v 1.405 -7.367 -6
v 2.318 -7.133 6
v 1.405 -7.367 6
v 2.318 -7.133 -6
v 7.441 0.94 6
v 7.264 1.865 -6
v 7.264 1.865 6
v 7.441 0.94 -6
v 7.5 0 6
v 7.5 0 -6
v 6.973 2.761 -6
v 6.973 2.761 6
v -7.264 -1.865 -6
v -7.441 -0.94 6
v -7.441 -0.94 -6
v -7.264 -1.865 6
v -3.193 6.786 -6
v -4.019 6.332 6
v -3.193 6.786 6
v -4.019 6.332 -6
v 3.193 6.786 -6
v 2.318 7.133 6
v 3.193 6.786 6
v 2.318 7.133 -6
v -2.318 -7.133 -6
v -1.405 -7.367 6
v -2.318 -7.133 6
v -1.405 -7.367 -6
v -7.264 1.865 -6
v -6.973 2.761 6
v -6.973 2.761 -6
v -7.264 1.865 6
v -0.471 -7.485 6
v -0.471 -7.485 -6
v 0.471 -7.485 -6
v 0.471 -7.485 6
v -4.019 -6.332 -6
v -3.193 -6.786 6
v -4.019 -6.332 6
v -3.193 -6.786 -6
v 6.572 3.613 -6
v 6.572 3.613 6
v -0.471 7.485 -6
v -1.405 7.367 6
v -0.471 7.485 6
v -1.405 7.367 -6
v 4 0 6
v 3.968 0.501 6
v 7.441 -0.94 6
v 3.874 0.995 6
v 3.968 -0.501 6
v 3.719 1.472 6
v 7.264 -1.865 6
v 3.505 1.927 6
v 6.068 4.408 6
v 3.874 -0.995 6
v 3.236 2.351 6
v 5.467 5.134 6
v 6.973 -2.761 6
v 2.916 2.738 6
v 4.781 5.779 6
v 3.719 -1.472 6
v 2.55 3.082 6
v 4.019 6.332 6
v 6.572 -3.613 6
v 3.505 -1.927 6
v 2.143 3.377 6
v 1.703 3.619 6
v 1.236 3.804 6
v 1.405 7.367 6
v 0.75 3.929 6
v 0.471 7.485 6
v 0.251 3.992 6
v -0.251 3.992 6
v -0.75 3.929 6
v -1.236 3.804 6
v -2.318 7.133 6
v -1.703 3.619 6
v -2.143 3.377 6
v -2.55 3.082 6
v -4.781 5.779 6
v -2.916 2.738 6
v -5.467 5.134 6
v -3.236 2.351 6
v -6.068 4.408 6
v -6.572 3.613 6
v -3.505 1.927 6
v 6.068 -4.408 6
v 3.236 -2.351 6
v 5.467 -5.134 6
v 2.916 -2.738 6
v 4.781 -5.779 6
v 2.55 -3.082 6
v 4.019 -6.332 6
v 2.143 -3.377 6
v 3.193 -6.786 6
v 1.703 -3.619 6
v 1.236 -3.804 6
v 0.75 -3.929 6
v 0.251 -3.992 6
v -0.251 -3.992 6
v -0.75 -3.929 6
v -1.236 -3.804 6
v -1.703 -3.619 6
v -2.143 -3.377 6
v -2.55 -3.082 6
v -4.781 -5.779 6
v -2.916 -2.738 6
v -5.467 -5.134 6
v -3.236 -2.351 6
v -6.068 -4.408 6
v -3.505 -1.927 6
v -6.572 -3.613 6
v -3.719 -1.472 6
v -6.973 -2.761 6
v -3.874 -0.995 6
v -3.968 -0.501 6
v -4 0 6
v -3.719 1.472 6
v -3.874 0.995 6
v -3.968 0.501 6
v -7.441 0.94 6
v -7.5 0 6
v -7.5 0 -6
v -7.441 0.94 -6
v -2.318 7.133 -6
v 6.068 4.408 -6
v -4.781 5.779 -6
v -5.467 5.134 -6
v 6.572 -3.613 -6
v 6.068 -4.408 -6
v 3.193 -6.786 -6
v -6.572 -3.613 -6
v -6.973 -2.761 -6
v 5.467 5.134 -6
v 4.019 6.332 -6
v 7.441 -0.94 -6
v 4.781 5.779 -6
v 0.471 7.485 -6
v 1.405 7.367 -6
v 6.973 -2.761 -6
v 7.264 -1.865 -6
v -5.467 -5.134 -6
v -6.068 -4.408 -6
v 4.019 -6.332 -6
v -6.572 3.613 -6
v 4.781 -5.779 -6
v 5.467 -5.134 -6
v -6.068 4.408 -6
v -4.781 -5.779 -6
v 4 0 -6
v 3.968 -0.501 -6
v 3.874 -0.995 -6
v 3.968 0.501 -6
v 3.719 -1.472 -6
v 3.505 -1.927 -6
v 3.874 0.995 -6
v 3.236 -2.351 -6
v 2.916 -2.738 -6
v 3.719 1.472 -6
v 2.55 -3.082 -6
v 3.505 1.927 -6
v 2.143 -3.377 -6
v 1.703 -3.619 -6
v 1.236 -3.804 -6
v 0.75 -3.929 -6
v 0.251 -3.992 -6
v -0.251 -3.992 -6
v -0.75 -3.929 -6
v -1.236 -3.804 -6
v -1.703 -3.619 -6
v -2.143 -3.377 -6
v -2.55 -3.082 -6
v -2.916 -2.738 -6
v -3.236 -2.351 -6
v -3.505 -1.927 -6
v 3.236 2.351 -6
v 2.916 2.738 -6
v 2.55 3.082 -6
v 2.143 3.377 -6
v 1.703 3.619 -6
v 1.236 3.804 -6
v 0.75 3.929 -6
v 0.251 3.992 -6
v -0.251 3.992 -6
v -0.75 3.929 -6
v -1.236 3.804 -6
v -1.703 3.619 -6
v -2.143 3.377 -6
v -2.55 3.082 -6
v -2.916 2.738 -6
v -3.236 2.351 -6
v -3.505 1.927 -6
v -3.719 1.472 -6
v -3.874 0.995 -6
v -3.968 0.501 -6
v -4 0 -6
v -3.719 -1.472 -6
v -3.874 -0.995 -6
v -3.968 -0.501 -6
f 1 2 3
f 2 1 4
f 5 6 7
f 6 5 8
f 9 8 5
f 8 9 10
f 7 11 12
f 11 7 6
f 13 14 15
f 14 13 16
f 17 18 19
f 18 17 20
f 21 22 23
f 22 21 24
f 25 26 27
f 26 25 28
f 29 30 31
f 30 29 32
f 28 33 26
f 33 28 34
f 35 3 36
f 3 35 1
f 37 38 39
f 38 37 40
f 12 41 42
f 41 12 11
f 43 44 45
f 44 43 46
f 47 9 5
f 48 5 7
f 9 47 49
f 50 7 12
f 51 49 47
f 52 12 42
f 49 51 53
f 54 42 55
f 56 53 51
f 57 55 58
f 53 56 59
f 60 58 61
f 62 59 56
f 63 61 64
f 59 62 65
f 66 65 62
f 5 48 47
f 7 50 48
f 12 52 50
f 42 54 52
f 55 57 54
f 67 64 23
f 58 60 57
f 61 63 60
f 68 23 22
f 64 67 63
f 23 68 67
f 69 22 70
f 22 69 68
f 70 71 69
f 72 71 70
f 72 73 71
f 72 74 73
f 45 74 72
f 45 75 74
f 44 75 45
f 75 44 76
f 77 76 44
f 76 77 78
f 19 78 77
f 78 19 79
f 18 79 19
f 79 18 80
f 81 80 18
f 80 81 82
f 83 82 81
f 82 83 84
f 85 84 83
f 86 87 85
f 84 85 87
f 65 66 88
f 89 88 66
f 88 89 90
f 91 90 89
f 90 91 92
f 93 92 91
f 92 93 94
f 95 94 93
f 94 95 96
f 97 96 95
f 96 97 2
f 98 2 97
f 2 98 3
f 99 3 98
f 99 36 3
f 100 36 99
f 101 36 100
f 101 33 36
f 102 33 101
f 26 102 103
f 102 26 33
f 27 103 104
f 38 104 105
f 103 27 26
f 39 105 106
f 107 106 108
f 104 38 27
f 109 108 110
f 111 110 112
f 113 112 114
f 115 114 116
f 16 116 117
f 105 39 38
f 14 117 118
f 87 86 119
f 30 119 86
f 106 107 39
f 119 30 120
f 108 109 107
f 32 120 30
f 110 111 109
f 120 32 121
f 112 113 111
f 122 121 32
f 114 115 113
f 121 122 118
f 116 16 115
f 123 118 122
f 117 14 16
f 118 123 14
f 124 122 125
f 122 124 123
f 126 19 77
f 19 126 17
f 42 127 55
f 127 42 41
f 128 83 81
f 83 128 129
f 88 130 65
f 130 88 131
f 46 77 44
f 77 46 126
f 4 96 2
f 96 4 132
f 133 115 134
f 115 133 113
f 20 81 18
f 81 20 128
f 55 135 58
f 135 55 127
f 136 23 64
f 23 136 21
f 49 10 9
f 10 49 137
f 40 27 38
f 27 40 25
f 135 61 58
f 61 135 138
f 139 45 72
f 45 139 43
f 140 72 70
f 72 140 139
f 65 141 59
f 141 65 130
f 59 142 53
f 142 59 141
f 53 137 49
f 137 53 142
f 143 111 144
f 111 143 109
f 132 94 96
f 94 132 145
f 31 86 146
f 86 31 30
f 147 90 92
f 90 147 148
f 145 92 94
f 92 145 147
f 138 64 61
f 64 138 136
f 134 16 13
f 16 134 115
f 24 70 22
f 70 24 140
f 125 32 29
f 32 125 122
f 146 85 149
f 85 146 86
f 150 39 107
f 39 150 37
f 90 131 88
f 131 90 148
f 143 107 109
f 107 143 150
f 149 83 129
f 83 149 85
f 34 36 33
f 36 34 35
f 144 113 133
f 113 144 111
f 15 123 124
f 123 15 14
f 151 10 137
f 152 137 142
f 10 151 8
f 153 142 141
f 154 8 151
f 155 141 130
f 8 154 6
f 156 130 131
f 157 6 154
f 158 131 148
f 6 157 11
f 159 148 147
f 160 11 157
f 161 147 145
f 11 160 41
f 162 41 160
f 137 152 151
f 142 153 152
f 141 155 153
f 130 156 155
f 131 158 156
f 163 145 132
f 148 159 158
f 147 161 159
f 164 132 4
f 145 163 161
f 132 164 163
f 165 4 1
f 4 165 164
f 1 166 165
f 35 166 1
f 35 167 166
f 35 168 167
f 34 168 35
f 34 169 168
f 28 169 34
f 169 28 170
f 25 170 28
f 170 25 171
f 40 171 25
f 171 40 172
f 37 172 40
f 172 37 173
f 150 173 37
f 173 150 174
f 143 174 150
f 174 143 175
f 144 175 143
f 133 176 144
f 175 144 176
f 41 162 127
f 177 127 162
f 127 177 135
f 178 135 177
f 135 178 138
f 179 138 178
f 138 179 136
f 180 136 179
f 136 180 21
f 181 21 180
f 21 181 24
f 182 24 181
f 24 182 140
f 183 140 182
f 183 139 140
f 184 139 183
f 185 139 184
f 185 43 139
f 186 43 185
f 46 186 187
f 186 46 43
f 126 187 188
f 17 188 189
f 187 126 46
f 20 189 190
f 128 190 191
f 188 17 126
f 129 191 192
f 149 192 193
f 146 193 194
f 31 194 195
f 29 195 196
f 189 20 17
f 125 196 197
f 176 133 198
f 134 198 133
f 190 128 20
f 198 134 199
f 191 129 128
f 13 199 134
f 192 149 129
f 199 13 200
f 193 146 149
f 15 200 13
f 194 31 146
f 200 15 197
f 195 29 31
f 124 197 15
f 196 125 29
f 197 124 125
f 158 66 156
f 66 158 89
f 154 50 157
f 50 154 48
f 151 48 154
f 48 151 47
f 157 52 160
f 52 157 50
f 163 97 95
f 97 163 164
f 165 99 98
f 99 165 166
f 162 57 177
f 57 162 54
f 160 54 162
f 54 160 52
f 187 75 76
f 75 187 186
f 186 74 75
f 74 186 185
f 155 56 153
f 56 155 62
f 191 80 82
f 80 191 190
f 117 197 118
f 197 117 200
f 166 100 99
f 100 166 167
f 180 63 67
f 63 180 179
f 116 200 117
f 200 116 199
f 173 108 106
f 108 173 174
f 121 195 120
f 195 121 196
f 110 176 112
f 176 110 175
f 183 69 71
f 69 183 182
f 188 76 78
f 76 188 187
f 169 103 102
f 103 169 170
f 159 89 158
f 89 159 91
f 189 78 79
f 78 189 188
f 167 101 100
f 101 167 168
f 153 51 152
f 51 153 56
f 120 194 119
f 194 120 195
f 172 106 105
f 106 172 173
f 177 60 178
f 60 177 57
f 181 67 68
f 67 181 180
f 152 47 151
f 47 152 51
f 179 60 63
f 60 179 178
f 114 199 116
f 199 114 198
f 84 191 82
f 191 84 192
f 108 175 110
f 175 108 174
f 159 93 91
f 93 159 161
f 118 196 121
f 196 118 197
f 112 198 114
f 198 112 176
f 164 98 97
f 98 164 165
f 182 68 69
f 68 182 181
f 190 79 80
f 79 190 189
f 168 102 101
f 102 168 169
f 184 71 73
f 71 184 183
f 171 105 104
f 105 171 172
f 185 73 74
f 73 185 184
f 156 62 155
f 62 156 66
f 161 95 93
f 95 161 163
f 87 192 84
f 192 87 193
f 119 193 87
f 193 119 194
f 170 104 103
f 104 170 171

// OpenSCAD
$fn = 50;


difference() {
	union() {
		translate(v = [0, 0, -6.0000000000]) {
			cylinder(h = 12, r = 7.5000000000);
		}
	}
	union() {
		translate(v = [0, 0, -100.0000000000]) {
			cylinder(h = 200, r = 4.0000000000);
		}
	}
}
